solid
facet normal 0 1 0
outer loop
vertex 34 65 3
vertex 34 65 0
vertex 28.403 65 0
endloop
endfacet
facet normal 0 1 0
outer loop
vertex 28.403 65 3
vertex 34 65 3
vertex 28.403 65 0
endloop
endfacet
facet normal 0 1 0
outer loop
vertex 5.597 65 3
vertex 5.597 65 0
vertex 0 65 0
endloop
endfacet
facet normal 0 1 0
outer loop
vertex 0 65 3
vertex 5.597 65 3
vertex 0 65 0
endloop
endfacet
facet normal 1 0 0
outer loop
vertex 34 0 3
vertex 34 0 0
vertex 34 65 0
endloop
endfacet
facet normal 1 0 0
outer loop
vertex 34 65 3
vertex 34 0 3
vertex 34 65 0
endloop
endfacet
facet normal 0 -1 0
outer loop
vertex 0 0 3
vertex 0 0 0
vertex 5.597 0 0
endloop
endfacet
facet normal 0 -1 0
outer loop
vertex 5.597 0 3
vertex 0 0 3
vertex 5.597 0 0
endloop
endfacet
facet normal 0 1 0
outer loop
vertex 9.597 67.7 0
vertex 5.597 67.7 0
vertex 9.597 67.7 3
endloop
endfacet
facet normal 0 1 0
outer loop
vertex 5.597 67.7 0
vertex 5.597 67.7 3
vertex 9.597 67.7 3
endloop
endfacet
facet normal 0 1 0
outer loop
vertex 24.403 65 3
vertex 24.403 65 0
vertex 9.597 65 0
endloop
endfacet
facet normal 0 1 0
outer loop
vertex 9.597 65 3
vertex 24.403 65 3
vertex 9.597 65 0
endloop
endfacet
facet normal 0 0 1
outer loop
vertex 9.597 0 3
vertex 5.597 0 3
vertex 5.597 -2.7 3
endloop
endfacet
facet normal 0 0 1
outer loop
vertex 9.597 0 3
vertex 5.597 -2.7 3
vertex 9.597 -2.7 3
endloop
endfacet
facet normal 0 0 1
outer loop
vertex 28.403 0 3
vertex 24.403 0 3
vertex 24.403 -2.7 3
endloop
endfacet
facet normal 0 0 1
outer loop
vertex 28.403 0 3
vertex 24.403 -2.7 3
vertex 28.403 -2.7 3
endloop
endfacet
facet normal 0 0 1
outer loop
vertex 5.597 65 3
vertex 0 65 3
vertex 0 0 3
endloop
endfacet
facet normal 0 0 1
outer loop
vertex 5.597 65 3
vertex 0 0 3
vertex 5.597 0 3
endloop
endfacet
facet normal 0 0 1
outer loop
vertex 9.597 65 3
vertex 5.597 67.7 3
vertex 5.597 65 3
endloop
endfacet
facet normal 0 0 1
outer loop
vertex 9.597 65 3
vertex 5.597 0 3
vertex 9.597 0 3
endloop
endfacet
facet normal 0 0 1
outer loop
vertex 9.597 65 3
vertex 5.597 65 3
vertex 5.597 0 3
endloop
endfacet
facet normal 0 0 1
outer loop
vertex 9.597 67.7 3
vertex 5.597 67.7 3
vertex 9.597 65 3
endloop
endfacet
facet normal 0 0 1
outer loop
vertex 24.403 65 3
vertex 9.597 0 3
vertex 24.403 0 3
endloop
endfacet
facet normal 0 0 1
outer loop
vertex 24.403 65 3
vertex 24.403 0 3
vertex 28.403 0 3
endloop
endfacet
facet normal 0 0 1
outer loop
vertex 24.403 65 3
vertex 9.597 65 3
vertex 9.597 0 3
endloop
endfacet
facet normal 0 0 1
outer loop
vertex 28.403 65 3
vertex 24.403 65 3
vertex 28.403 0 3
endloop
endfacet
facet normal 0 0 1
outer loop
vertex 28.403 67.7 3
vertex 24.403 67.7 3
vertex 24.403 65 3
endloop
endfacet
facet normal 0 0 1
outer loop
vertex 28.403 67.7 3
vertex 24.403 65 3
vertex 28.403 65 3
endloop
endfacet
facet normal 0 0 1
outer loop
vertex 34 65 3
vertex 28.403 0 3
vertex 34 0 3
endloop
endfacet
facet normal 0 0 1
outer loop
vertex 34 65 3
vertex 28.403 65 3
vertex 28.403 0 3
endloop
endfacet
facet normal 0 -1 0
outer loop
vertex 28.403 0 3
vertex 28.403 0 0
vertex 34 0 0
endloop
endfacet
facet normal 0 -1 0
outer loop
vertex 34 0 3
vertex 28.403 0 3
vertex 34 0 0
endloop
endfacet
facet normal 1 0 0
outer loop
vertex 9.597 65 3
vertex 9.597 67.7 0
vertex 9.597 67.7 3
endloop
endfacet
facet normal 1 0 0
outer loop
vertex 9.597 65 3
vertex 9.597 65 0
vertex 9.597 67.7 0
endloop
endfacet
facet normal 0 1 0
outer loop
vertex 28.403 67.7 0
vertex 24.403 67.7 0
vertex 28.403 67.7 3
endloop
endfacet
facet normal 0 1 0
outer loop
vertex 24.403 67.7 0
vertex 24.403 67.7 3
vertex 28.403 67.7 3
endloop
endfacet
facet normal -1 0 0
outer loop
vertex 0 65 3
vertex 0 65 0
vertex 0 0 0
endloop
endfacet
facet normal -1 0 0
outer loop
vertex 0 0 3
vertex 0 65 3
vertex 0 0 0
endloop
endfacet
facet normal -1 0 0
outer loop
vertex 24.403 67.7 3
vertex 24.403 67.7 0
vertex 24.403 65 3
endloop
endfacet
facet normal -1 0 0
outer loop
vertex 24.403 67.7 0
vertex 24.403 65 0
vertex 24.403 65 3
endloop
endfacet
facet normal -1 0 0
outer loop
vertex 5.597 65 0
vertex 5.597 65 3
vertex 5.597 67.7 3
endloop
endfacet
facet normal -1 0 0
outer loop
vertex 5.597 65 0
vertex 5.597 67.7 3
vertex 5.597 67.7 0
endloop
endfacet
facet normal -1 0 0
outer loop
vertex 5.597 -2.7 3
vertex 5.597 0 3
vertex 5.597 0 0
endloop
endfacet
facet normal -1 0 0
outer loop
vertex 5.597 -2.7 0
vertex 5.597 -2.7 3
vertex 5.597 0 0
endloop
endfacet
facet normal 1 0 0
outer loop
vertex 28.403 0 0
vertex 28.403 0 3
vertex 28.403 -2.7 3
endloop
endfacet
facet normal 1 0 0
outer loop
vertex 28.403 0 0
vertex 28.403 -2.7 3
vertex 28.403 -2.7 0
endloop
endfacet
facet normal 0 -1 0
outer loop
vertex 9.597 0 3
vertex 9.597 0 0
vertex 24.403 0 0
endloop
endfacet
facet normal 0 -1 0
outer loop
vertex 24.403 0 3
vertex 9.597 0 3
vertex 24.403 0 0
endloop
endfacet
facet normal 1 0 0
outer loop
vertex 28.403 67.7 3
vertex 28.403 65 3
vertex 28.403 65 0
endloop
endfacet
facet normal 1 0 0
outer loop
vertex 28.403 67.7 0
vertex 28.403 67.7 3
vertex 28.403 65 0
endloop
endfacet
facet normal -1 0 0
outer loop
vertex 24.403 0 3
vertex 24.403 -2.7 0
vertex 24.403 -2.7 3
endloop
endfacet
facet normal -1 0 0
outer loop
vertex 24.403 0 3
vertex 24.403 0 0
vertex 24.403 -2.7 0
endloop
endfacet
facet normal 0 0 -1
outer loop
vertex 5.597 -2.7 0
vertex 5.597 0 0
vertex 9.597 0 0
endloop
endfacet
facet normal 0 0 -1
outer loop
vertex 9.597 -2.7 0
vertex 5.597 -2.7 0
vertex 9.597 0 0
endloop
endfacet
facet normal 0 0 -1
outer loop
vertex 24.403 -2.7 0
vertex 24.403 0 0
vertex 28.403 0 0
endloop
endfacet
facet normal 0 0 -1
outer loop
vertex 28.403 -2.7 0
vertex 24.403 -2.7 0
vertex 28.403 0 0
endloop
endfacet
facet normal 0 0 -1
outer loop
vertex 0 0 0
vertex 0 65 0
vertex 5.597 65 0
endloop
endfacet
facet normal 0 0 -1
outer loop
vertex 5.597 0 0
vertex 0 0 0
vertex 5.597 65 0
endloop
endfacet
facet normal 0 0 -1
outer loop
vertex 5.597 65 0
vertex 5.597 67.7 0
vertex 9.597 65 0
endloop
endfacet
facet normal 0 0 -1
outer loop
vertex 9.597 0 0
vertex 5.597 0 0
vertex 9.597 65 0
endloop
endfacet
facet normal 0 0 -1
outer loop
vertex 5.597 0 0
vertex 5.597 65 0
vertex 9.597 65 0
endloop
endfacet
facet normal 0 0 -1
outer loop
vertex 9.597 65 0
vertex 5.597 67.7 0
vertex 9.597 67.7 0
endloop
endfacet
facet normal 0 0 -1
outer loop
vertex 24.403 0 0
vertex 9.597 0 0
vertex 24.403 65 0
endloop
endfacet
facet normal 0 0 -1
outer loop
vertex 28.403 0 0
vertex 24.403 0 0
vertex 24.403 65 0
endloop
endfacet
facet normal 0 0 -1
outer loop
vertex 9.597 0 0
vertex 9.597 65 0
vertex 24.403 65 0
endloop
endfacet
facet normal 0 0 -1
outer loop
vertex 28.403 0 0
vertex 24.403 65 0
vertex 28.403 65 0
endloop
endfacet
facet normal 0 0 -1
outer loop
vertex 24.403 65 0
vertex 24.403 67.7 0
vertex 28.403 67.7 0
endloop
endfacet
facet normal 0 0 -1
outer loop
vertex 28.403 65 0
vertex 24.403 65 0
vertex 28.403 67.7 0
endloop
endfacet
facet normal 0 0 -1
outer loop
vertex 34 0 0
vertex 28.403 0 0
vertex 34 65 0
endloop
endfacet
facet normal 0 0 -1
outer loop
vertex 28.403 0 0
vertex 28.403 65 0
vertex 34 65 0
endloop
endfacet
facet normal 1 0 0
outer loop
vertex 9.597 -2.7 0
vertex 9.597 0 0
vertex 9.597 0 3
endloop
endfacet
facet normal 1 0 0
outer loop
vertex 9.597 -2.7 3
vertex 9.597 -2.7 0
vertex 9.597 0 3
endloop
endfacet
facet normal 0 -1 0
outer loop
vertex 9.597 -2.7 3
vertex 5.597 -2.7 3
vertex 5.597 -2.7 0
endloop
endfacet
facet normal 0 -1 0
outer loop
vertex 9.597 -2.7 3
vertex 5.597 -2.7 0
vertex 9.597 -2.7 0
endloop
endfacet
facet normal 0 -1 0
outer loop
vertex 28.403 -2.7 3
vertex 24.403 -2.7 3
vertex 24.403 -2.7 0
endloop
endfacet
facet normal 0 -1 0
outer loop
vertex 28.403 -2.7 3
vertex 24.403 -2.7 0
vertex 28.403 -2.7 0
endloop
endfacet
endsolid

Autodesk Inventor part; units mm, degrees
ref_plane "YZ Plane" through (0, 0, 0) normal (1, 0, 0) x (0, 1, 0)
ref_plane "XZ Plane" through (0, 0, 0) normal (0, 1, 0) x (-1, 0, 0)
ref_plane "XY Plane" through (0, 0, 0) normal (0, 0, 1) x (1, 0, 0)
sketch "Sketch1" plane through (0, 0, 0) normal (0, 0, 1) x (1, 0, 0)
  line L0 (0, 0) -> (34, 0)
  line L1 (34, 0) -> (34, 65)
  line L2 (34, 65) -> (0, 65)
  line L3 (0, 65) -> (0, 0)
  dimension "d0" = 34
  dimension "d1" = 65
  dimension "d2" = 34
extrude "Extrusion1" add sketch "Sketch1" along normal blind 3
sketch "Sketch2" plane through (0, 0, 0) normal (0, -1, 0) x (1, 0, 0)
  point P0 (0, 0)
sketch "Sketch3" plane through (0, 0, 0) normal (0, -1, 0) x (1, 0, 0)
  line L0 (0, 0) -> (0, 3) projected
  line L1 (0, 1.5) -> (34, 1.5)
  line L2 (34, 0) -> (34, 3) projected
  line L3 (17, 1.5) -> (9.597, 1.5)
  line L4 (9.597, 1.5) -> (9.597, 3)
  line L5 (9.597, 3) -> (5.597, 3)
  line L6 (5.597, 3) -> (5.597, 0)
  line L7 (5.597, 0) -> (9.597, 0)
  line L8 (9.597, 0) -> (9.597, 1.5)
  line L9 (17, 1.5) -> (24.403, 1.5)
  line L10 (24.403, 1.5) -> (24.403, 3)
  line L11 (24.403, 3) -> (28.403, 3)
  line L12 (28.403, 3) -> (28.403, 0)
  line L13 (28.403, 0) -> (24.403, 0)
  line L14 (24.403, 0) -> (24.403, 1.5)
  dimension "d5" = 7.403
  dimension "d6" = 1.5
  dimension "d7" = 4
  dimension "d10" = 4
  dimension "d11" = 7.403
  dimension "d12" = 1.5
  dimension "d13" = 4
  dimension "d14" = 3
  dimension "d15" = 4
extrude "Extrusion2" add sketch "Sketch3" along normal blind 2.7
extrude "Extrusion3" add sketch "Sketch3" against normal blind 2.7 from surface at -65
properties part number "carcasa_piezaLateral_ruedas"
